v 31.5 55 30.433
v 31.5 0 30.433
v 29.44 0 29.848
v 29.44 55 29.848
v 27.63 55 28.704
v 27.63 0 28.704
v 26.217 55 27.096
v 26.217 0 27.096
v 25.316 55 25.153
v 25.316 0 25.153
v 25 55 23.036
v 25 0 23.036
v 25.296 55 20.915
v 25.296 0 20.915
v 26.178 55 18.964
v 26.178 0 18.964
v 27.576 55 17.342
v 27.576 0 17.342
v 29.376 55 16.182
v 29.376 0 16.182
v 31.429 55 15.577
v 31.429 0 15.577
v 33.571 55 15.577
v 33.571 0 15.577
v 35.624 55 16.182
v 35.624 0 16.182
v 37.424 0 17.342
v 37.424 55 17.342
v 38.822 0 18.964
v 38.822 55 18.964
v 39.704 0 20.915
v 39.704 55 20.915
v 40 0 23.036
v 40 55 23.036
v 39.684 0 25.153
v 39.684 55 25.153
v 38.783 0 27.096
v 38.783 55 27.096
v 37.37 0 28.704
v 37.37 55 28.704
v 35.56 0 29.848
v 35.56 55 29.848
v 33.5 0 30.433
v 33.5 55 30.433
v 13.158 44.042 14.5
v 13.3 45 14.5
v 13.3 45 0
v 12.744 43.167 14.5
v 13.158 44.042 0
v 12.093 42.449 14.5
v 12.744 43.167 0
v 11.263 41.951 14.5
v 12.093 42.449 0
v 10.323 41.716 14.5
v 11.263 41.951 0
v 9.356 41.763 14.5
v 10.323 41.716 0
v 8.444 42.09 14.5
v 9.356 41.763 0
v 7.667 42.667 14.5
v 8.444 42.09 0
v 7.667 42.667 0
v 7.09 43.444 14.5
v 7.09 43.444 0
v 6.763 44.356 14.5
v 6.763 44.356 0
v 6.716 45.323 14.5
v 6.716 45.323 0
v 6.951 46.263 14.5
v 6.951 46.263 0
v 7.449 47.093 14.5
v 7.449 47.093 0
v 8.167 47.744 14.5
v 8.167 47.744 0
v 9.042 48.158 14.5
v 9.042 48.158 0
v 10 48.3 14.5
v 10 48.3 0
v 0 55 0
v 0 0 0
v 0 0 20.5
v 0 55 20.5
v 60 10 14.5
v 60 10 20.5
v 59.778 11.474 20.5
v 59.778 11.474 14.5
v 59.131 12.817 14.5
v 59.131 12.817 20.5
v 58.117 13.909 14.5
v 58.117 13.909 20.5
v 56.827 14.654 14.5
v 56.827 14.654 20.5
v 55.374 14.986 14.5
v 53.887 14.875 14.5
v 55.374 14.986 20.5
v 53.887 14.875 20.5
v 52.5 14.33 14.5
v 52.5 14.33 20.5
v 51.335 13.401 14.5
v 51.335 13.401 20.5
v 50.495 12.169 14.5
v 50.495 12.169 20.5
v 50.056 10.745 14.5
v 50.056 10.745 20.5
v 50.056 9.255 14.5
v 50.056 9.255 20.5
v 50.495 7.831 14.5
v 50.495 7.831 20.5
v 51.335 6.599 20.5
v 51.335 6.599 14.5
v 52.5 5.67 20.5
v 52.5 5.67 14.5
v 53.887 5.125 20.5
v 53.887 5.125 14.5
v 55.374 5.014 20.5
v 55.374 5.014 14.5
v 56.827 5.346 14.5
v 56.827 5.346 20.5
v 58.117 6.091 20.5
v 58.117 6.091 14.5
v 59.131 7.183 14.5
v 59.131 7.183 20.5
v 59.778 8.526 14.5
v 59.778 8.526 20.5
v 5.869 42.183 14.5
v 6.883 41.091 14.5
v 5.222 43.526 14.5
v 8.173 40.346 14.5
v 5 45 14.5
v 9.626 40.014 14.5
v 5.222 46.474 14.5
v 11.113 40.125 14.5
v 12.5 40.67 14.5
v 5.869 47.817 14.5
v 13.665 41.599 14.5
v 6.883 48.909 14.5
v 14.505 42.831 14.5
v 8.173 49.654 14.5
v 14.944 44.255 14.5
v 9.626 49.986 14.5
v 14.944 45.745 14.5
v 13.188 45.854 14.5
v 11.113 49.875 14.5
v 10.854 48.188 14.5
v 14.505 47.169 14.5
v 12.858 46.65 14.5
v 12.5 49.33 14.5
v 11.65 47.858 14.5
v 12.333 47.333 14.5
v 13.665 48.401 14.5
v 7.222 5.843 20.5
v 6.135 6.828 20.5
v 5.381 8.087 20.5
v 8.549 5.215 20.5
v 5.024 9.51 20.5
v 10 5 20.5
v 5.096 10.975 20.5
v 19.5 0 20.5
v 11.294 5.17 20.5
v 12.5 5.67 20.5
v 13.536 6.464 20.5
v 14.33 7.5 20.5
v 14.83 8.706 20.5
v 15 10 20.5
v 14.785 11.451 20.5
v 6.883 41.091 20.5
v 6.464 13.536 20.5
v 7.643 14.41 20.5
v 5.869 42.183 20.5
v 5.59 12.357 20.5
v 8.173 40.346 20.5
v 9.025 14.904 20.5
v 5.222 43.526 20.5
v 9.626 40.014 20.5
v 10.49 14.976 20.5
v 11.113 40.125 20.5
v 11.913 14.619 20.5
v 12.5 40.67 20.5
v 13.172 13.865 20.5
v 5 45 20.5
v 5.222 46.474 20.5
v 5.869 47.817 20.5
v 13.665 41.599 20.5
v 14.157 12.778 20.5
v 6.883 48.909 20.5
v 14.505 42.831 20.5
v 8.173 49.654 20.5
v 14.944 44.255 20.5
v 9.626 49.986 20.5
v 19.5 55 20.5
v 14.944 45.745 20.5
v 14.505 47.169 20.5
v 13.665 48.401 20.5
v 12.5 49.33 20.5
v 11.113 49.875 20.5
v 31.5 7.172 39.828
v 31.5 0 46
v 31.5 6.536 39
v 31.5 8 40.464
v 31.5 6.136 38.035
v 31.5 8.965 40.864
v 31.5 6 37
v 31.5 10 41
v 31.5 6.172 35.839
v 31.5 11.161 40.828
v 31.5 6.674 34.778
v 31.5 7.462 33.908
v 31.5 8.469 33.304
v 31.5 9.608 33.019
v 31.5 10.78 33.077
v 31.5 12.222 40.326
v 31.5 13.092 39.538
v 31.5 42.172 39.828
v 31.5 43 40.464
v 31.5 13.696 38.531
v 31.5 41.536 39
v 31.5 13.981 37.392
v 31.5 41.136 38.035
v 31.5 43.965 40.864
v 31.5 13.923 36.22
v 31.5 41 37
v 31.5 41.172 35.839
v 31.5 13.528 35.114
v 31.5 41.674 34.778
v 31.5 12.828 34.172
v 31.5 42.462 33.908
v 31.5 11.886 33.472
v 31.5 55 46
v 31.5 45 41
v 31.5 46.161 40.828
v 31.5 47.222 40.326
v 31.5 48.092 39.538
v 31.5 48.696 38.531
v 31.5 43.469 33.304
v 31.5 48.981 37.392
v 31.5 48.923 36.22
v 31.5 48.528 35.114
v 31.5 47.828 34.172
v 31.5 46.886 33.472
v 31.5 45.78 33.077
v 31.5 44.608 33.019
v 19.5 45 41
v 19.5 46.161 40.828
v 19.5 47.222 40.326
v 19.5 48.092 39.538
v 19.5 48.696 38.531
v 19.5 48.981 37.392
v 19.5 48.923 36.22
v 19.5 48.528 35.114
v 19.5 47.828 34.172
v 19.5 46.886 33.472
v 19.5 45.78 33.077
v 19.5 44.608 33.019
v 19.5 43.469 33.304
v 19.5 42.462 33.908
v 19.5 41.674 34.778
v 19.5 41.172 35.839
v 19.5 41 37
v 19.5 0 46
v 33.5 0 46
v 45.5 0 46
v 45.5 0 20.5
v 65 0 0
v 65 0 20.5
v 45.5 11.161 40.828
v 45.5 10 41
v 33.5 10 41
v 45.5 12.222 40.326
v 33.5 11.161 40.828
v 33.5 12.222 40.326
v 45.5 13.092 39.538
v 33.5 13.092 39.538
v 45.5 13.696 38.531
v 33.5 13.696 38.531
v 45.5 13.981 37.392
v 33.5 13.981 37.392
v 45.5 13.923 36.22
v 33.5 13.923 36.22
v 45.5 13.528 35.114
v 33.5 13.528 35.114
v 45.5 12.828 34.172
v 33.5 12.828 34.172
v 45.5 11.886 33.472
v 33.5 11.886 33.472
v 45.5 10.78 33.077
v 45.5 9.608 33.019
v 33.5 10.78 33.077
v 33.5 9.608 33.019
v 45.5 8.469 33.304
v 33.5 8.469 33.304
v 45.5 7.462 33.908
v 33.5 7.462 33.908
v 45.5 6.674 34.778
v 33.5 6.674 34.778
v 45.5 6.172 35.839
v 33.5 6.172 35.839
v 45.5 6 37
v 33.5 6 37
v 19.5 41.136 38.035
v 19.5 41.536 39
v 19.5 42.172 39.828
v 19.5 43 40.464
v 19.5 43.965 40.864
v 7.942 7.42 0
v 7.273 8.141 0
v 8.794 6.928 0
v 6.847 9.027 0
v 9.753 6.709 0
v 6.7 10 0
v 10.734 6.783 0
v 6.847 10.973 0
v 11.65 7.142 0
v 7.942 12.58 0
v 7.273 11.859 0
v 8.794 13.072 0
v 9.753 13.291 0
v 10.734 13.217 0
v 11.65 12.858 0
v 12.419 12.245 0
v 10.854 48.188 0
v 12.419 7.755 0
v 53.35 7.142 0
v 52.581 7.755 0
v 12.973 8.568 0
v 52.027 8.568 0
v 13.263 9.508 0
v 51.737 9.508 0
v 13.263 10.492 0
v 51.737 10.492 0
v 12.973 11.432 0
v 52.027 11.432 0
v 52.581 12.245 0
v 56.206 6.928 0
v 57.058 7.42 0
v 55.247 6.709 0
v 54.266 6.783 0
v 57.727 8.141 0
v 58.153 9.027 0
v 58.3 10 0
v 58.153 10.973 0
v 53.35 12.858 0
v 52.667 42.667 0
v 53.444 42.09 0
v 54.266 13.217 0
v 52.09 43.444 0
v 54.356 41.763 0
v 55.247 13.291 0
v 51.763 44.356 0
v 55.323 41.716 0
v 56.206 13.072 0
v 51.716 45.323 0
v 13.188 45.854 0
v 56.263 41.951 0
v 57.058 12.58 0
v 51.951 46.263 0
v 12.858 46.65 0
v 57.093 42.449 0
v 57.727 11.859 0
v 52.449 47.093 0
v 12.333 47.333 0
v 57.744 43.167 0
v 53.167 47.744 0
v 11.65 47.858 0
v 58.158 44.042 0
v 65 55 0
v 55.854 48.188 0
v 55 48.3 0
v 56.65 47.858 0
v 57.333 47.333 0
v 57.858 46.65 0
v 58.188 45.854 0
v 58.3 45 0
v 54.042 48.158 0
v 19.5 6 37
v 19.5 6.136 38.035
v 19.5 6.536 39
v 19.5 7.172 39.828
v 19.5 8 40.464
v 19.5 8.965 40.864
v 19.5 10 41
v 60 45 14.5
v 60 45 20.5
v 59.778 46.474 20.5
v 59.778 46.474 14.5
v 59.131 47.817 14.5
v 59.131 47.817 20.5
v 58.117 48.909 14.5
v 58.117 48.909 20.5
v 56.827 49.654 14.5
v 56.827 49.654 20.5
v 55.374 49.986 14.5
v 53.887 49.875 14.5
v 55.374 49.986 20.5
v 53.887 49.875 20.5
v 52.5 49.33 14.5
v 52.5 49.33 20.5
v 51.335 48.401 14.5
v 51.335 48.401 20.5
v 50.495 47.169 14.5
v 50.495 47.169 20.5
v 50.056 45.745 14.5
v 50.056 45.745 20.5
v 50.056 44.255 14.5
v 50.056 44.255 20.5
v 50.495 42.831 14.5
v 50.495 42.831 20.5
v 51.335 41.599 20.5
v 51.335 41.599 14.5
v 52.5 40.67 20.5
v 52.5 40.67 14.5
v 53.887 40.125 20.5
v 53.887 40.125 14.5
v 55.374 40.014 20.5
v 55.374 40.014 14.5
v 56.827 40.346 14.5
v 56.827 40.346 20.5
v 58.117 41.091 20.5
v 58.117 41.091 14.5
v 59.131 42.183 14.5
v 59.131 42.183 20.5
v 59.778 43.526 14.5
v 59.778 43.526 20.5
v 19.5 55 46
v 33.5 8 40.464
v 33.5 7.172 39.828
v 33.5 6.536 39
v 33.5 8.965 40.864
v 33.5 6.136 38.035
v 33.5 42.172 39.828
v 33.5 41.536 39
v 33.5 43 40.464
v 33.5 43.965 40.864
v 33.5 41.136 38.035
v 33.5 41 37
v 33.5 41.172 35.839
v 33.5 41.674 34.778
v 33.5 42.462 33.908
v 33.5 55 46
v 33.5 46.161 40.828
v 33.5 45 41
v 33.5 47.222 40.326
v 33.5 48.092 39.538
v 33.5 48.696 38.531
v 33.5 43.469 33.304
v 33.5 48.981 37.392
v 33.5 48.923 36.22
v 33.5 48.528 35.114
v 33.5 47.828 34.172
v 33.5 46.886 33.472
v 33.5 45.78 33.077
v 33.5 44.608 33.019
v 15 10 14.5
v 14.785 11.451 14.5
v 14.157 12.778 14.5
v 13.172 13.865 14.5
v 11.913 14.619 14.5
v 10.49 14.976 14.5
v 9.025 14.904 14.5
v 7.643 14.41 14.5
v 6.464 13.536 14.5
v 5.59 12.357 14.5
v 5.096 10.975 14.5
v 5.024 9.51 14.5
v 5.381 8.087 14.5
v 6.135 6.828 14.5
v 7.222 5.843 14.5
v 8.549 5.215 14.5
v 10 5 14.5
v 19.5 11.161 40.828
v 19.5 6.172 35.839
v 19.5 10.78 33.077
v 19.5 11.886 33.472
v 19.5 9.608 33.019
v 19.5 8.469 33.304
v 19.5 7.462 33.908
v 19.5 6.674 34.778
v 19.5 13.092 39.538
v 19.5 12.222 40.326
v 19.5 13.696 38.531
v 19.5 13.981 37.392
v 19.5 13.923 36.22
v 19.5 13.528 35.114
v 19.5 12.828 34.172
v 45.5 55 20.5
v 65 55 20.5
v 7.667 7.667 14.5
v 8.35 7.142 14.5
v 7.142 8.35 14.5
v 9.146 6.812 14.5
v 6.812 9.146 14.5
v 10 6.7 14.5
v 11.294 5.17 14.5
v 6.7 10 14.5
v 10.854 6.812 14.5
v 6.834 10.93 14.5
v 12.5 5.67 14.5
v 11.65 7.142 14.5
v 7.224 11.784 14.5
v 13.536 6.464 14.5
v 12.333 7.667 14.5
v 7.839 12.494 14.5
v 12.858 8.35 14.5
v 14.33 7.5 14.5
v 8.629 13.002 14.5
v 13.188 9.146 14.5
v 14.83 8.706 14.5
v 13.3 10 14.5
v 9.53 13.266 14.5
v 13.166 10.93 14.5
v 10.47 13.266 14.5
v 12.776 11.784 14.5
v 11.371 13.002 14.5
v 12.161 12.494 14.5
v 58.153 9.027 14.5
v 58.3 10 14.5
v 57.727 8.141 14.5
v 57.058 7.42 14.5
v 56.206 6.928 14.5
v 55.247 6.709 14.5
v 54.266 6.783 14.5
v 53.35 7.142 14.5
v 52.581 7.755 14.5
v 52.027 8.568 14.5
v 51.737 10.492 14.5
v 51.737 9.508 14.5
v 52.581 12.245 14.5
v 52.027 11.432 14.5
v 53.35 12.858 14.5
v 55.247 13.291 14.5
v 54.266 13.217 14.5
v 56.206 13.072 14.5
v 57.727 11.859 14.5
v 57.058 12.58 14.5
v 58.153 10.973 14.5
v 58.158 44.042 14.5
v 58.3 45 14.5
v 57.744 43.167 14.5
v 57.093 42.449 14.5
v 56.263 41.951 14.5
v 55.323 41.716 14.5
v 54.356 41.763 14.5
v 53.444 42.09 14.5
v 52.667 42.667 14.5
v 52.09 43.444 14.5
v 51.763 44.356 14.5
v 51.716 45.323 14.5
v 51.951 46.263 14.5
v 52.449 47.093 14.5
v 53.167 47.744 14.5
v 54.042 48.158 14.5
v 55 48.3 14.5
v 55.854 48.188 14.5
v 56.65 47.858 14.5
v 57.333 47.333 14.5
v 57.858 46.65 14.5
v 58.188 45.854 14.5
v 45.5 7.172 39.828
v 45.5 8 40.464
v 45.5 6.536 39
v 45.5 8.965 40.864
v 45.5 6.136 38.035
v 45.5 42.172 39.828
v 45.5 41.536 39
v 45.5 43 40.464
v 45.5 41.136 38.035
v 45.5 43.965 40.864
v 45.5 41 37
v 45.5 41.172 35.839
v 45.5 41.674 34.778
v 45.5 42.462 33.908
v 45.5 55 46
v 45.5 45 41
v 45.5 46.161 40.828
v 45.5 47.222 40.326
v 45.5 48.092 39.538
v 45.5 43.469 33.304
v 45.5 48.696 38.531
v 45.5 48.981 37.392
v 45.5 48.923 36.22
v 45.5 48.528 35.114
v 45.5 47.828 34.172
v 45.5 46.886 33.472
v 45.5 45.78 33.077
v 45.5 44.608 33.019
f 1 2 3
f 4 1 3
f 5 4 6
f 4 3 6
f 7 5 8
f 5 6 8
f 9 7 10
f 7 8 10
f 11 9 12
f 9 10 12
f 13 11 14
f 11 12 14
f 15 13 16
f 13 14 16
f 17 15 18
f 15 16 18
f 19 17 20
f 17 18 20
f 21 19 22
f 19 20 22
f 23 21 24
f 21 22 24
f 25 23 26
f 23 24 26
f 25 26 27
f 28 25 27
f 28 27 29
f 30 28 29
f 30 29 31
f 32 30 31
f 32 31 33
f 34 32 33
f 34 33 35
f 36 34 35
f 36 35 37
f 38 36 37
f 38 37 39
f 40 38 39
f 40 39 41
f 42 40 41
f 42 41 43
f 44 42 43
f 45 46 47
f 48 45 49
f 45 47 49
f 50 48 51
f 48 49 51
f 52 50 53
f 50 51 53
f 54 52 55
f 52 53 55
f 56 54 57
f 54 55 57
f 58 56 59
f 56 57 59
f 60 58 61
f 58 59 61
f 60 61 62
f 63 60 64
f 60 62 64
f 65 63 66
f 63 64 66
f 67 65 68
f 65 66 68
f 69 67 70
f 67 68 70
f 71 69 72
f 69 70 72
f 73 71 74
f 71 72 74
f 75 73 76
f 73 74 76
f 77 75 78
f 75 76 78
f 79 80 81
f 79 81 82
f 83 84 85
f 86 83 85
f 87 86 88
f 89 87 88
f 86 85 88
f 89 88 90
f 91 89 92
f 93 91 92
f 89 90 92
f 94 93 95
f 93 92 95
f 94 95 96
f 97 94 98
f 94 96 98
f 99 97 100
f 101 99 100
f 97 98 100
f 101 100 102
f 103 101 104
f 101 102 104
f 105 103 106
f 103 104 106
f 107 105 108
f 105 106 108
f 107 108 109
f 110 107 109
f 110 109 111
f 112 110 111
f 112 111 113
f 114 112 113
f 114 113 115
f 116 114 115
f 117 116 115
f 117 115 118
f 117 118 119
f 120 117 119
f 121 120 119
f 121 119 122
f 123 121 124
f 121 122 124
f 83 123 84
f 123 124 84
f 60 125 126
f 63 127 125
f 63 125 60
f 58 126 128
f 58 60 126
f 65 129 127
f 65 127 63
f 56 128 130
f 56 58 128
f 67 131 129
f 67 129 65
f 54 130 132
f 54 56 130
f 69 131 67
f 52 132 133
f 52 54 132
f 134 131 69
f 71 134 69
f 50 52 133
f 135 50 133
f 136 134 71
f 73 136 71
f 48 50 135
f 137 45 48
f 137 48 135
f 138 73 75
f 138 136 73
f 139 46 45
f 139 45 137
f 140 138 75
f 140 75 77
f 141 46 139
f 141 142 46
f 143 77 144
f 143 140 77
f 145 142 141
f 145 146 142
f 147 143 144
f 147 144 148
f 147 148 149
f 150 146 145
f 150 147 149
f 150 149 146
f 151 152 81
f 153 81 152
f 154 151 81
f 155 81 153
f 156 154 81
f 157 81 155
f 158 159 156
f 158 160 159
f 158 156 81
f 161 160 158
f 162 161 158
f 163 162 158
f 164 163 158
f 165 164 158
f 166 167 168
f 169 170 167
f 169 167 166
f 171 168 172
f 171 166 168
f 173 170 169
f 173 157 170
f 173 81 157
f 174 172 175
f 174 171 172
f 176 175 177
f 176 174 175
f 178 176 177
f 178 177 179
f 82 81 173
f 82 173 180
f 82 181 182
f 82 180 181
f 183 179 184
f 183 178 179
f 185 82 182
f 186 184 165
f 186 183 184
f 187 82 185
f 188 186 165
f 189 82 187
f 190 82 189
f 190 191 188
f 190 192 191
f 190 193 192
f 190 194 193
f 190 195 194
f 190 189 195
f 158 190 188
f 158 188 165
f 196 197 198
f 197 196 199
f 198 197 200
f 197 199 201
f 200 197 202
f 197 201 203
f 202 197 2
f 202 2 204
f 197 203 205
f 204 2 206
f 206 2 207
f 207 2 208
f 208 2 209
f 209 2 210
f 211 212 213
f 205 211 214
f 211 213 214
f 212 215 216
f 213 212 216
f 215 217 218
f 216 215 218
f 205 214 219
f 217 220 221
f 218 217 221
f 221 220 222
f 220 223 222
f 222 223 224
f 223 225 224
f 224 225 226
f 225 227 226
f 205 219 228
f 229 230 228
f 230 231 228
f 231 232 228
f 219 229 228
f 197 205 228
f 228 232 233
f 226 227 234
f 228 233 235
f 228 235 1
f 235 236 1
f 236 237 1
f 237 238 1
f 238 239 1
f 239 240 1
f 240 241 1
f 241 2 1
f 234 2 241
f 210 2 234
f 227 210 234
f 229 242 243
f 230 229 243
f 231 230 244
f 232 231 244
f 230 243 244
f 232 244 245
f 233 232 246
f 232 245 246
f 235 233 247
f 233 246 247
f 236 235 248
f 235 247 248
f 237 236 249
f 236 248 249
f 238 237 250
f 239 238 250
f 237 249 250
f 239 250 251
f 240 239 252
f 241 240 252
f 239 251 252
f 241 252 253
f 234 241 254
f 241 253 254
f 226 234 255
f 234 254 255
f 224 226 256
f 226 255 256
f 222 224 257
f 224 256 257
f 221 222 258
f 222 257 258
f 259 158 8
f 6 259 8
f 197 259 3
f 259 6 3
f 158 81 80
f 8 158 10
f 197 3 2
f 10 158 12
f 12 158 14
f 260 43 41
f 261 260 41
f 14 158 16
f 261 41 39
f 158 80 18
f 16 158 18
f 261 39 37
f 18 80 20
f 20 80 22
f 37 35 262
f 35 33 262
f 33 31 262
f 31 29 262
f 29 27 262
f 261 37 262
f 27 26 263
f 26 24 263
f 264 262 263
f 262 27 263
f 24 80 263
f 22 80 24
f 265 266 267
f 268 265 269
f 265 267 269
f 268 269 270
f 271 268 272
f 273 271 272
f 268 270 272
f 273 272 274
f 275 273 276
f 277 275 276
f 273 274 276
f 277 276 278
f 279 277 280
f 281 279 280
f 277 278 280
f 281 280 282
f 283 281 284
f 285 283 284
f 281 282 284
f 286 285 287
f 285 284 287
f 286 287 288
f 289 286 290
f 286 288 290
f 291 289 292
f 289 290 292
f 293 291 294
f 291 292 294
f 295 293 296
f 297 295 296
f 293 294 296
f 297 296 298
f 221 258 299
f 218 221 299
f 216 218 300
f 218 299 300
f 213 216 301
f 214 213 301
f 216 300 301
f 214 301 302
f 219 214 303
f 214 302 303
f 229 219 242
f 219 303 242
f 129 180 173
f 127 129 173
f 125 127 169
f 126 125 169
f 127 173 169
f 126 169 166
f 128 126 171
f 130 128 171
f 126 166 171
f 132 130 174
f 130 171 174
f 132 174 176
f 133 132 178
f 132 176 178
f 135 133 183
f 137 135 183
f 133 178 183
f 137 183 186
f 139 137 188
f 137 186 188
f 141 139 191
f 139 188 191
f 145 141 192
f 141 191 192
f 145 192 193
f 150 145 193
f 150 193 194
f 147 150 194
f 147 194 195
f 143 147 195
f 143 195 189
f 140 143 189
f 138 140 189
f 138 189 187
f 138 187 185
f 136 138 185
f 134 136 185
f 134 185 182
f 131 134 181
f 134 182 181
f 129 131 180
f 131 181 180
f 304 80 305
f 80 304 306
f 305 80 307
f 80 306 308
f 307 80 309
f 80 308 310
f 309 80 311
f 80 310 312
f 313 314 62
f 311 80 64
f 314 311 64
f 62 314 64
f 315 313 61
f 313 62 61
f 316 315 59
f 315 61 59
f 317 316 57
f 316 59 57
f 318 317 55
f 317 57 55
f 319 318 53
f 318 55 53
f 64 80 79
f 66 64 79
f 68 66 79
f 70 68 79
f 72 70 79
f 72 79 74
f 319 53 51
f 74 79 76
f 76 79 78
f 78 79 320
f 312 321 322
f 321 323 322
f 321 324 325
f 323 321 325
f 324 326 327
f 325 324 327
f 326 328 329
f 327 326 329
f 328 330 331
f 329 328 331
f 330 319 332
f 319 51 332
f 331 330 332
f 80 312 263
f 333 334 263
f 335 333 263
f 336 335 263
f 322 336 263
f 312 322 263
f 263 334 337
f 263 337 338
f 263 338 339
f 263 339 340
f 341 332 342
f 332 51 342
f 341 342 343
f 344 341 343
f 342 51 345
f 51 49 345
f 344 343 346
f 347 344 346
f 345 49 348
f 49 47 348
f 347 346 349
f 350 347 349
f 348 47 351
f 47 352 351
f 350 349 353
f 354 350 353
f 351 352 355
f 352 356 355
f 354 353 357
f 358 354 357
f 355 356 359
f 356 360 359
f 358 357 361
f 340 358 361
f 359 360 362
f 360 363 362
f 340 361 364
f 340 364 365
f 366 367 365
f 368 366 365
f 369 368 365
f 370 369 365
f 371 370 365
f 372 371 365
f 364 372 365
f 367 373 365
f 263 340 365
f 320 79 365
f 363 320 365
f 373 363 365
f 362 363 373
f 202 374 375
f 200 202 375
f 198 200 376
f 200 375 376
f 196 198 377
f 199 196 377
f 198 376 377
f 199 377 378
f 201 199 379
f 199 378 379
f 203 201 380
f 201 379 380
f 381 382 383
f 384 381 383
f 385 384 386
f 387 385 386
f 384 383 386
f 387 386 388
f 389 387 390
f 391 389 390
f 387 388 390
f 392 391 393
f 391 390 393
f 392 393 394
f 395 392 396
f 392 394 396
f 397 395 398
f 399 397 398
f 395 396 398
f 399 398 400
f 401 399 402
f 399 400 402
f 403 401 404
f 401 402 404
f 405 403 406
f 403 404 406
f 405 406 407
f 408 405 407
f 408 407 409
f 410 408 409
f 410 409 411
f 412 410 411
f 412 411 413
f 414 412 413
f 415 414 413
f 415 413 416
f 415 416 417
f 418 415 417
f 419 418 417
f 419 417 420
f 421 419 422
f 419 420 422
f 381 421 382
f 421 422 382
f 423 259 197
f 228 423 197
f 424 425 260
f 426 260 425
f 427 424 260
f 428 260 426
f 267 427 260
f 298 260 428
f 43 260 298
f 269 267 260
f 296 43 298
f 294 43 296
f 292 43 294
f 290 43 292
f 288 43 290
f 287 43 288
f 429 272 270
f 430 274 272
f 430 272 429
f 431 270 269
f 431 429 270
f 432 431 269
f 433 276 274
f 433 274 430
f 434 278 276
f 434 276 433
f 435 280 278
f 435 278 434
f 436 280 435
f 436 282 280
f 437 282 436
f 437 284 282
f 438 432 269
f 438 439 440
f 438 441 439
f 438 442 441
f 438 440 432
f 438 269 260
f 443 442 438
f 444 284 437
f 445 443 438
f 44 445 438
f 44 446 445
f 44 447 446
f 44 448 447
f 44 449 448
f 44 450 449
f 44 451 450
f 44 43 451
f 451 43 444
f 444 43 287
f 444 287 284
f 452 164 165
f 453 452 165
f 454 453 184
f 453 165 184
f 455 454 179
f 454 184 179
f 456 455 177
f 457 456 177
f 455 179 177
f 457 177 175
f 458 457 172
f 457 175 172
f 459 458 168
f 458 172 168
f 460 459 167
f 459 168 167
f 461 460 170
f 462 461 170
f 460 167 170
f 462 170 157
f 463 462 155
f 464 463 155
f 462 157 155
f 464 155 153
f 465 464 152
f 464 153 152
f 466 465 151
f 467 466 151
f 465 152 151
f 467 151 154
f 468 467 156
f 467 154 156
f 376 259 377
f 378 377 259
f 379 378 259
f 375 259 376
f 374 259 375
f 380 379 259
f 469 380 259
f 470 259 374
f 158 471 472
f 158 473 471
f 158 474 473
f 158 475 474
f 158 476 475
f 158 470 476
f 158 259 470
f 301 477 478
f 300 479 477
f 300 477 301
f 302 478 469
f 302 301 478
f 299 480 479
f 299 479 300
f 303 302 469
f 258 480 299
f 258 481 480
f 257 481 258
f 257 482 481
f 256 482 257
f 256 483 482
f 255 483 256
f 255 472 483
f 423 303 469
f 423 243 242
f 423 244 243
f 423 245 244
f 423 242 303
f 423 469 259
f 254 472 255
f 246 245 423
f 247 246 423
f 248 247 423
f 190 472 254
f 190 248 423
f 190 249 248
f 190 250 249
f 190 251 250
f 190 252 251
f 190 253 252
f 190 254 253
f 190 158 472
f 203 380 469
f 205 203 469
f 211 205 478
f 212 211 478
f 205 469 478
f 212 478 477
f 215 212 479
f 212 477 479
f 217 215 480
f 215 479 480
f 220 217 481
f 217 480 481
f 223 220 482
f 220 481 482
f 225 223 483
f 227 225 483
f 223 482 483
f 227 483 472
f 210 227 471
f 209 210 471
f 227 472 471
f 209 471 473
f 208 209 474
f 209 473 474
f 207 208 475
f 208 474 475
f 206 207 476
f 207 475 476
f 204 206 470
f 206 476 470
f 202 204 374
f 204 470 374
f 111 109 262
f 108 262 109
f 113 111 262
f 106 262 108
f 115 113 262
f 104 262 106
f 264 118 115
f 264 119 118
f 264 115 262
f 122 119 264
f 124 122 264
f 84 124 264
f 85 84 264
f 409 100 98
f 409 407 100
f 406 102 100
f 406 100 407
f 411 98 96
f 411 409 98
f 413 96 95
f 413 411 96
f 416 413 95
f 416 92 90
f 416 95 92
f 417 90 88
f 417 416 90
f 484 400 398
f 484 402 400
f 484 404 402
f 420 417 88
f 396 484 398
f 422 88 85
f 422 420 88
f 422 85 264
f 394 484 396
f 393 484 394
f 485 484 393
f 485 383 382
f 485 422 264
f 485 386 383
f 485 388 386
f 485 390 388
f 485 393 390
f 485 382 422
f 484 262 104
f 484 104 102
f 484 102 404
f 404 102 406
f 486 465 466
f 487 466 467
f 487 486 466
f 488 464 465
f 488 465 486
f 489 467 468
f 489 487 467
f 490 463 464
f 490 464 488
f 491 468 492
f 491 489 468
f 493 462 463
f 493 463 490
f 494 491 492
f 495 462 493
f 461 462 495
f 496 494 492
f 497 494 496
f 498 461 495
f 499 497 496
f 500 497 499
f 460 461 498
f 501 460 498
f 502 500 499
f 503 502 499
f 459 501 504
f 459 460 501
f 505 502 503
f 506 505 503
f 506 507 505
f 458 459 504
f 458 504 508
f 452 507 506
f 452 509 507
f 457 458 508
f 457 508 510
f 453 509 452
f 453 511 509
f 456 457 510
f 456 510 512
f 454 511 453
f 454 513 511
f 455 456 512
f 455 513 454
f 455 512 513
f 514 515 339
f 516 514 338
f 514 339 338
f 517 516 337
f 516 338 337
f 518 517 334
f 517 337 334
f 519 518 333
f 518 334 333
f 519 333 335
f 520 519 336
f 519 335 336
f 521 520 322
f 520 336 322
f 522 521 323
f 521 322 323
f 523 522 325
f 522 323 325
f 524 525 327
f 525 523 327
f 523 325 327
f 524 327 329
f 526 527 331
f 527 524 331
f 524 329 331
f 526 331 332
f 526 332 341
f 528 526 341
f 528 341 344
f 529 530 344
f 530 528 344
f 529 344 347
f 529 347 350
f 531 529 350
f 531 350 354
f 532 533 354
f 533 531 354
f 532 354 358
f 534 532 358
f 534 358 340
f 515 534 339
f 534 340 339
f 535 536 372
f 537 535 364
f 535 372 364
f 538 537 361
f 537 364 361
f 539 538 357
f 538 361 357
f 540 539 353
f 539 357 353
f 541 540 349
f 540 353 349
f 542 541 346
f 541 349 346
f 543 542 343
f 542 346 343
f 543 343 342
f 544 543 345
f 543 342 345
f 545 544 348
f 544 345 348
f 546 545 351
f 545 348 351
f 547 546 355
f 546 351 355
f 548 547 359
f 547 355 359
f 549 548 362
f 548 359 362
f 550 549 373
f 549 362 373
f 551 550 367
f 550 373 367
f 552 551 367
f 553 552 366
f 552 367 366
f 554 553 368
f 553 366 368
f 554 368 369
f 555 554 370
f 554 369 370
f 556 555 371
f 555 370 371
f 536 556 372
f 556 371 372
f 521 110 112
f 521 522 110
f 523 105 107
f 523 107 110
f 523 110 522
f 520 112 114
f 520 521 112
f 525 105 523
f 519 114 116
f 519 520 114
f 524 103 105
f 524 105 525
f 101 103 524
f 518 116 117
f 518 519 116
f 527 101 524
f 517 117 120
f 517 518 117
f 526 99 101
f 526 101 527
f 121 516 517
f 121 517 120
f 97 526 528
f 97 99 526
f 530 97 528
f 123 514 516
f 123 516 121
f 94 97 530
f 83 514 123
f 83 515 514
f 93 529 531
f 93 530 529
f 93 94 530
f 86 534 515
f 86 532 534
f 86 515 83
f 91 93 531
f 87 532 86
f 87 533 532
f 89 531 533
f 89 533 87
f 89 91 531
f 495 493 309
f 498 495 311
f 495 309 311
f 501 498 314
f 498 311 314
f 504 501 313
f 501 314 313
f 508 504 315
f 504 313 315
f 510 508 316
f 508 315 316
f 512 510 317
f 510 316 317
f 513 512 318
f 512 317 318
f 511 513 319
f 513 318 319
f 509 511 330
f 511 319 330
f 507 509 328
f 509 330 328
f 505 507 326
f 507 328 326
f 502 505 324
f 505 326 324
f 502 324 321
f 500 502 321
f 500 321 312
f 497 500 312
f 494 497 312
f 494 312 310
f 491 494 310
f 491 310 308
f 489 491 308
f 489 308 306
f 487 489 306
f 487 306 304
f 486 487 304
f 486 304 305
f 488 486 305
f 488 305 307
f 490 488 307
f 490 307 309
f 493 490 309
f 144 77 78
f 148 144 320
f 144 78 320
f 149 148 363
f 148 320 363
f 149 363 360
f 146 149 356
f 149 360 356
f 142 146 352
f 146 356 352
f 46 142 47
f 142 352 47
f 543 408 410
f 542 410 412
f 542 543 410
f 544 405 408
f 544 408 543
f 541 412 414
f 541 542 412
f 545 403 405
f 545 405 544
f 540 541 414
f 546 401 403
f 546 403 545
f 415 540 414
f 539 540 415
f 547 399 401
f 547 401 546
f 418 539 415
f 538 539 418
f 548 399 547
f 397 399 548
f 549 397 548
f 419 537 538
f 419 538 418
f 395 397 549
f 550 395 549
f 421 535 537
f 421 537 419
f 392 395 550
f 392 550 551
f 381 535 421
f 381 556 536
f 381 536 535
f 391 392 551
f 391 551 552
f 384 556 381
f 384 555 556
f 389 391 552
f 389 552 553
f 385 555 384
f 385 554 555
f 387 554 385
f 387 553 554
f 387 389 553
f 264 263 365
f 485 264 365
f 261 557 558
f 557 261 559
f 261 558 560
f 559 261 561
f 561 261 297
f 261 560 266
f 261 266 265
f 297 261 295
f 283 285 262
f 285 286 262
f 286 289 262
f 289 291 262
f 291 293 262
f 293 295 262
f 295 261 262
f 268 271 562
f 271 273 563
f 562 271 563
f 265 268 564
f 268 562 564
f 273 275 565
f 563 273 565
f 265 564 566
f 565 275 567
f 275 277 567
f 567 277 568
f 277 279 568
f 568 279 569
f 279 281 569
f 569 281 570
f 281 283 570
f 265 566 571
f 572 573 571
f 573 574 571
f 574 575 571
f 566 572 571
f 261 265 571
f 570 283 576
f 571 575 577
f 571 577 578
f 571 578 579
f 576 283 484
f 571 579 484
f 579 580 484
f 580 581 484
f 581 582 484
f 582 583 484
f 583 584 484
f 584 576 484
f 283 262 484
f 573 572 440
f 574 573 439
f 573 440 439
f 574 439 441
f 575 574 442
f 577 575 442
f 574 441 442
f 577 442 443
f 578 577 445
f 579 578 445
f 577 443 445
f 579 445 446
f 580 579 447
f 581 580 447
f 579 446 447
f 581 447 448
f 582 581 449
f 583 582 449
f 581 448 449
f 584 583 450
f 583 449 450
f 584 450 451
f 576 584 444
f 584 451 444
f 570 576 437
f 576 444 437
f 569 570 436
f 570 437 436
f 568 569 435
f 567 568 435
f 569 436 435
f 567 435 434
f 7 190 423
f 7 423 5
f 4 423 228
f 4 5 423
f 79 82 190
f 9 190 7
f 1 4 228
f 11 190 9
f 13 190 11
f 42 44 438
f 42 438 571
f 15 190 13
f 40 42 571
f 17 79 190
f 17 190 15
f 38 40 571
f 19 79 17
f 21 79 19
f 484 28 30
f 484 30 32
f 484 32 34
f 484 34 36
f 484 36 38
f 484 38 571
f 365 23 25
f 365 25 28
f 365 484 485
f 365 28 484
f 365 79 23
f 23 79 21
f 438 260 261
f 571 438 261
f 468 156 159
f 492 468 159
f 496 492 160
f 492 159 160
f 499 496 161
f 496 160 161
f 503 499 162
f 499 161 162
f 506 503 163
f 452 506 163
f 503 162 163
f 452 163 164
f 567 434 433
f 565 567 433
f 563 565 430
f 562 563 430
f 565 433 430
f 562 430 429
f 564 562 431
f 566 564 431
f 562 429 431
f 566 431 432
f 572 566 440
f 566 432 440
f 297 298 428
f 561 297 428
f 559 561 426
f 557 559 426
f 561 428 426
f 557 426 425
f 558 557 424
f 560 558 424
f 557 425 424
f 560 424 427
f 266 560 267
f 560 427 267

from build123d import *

# Parameters (mm, degrees)
F0_W      = 65
F0_H      = 55
F1_DEPTH  = 20.5
F2_W      = 12
F2_H      = 55
F3_DEPTH  = 25.5
F5_DEPTH  = 74.8
F7_DEPTH  = 37.2
F9_R      = 5
F9_R_2    = 3.3
F10_DEPTH = 6
F8_R      = 3.3
F11_DEPTH = 45.5


with BuildPart() as f1:
    # F0 (on Top) → F1 (new body)
    with BuildSketch(Plane.XY):
        with Locations((32.5, 27.5)):
            Rectangle(F0_W, F0_H)
    extrude(amount=F1_DEPTH)

    # F2 (on face) → F3 (join)
    with BuildSketch(Plane.XY.offset(20.5)):
        with Locations((25.5, 27.5)):
            Rectangle(F2_W, F2_H)
        with Locations((39.5, 27.5)):
            Rectangle(F2_W, F2_H)
    extrude(amount=F3_DEPTH)

    # F4 (on face) → F5 (cut)
    with BuildSketch(Plane.XZ):
        with BuildLine():
            ThreePointArc((25, 23), (32.5, 15.5), (40, 23))
            ThreePointArc((40, 23), (32.5, 30.5), (25, 23))
        make_face()
    extrude(amount=-F5_DEPTH, mode=Mode.SUBTRACT)

    # F6 (on face) → F7 (cut)
    with BuildSketch(Plane(origin=(19.5, 0, 0), x_dir=(0, -1, 0), z_dir=(-1, 0, 0))):
        with BuildLine():
            ThreePointArc((-45, 41), (-47.8284271247, 34.1715728753), (-41, 37))
            ThreePointArc((-41, 37), (-42.1715728753, 39.8284271247), (-45, 41))
        make_face()
        with BuildLine():
            ThreePointArc((-10, 41), (-12.8284271247, 34.1715728753), (-6, 37))
            ThreePointArc((-6, 37), (-7.1715728753, 39.8284271247), (-10, 41))
        make_face()
    extrude(amount=-F7_DEPTH, mode=Mode.SUBTRACT)

    # F9 (on face) → F10 (cut)
    with BuildSketch(Plane.XY.offset(20.5)):
        with Locations((55, 45)):
            Circle(F9_R)
        with Locations((55, 45)):
            Circle(F9_R_2, mode=Mode.SUBTRACT)
        with BuildLine():
            ThreePointArc((15, 45), (10, 50), (5, 45))
            ThreePointArc((5, 45), (10, 40), (15, 45))
        make_face()
        with BuildLine():
            ThreePointArc((13.3, 45), (10, 41.7), (6.7, 45))
            ThreePointArc((6.7, 45), (10, 48.3), (13.3, 45))
        make_face(mode=Mode.SUBTRACT)
        with BuildLine():
            ThreePointArc((15, 10), (6.4644660941, 13.5355339059), (10, 5))
            ThreePointArc((10, 5), (13.5355339059, 6.4644660941), (15, 10))
        make_face()
        with BuildLine():
            ThreePointArc((13.3, 10), (12.3334523779, 7.6665476221), (10, 6.7))
            ThreePointArc((10, 6.7), (7.6665476221, 12.3334523779), (13.3, 10))
        make_face(mode=Mode.SUBTRACT)
        with Locations((55, 10)):
            Circle(F9_R)
        with Locations((55, 10)):
            Circle(F9_R_2, mode=Mode.SUBTRACT)
    extrude(amount=-F10_DEPTH, mode=Mode.SUBTRACT)

    # F8 (on face) → F11 (cut)
    with BuildSketch(Plane(origin=(0, 0, 0), x_dir=(1, 0, 0), z_dir=(0, 0, -1))):
        with BuildLine():
            ThreePointArc((13.3, -45), (7.6665476221, -42.6665476221), (10, -48.3))
            ThreePointArc((10, -48.3), (12.3334523779, -47.3334523779), (13.3, -45))
        make_face()
        with BuildLine():
            ThreePointArc((58.3, -45), (52.6665476221, -42.6665476221), (55, -48.3))
            ThreePointArc((55, -48.3), (57.3334523779, -47.3334523779), (58.3, -45))
        make_face()
        with Locations((55, -10)):
            Circle(F8_R)
        with BuildLine():
            ThreePointArc((13.3, -10), (10, -6.7), (6.7, -10))
            ThreePointArc((6.7, -10), (10, -13.3), (13.3, -10))
        make_face()
    extrude(amount=-F11_DEPTH, mode=Mode.SUBTRACT)


solid = f1.part
